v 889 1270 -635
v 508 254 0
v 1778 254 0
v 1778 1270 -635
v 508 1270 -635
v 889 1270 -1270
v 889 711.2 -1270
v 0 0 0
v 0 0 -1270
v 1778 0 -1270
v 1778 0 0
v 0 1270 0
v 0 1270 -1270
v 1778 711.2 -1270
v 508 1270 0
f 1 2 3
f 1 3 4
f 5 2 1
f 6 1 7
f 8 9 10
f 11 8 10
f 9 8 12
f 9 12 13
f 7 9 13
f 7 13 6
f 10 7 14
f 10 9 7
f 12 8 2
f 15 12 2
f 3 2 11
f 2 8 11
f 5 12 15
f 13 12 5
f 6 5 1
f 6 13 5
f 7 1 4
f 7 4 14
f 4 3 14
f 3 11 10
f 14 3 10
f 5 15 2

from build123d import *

# Parameters (mm, degrees)
SKETCH1_W               = 1778
SKETCH1_H               = 1270
BOSS_EXTRUDE1_DEPTH     = 1270
CUT_EXTRUDE1_DEPTH      = 2528.268090251
CUT_EXTRUDE1_DEPTH_BACK = 1270
CUT_EXTRUDE2_DEPTH      = 2528.268090251
CUT_EXTRUDE2_DEPTH_BACK = 889


with BuildPart() as part:
    # Sketch1 → Boss-Extrude1 (new body)
    with BuildSketch(Plane(origin=(0, 0, 0), x_dir=(1, 0, 0), z_dir=(0, 1, 0))):
        with Locations((889, 635)):
            Rectangle(SKETCH1_W, SKETCH1_H)
    extrude(amount=BOSS_EXTRUDE1_DEPTH)

    # Sketch2 → Cut-Extrude1 (cut, two sides: drawn at the far end of the back side and taken through both)
    with BuildSketch(Plane(origin=(1778, 0, 0), x_dir=(0, 0, -1), z_dir=(1, 0, 0)).offset(-CUT_EXTRUDE1_DEPTH_BACK)):
        Polygon((0, 254), (635, 1270), (0, 1270), align=None)
    extrude(amount=CUT_EXTRUDE1_DEPTH + CUT_EXTRUDE1_DEPTH_BACK, mode=Mode.SUBTRACT)

    # Sketch2<4> → Cut-Extrude2 (cut, two sides: drawn at the far end of the back side and taken through both)
    with BuildSketch(Plane(origin=(1778, 0, 0), x_dir=(0, 0, -1), z_dir=(1, 0, 0)).offset(-CUT_EXTRUDE2_DEPTH_BACK)):
        Polygon((1270, 1270), (635, 1270), (1270, 711.2), align=None)
    extrude(amount=CUT_EXTRUDE2_DEPTH + CUT_EXTRUDE2_DEPTH_BACK, mode=Mode.SUBTRACT)


solid = part.part
